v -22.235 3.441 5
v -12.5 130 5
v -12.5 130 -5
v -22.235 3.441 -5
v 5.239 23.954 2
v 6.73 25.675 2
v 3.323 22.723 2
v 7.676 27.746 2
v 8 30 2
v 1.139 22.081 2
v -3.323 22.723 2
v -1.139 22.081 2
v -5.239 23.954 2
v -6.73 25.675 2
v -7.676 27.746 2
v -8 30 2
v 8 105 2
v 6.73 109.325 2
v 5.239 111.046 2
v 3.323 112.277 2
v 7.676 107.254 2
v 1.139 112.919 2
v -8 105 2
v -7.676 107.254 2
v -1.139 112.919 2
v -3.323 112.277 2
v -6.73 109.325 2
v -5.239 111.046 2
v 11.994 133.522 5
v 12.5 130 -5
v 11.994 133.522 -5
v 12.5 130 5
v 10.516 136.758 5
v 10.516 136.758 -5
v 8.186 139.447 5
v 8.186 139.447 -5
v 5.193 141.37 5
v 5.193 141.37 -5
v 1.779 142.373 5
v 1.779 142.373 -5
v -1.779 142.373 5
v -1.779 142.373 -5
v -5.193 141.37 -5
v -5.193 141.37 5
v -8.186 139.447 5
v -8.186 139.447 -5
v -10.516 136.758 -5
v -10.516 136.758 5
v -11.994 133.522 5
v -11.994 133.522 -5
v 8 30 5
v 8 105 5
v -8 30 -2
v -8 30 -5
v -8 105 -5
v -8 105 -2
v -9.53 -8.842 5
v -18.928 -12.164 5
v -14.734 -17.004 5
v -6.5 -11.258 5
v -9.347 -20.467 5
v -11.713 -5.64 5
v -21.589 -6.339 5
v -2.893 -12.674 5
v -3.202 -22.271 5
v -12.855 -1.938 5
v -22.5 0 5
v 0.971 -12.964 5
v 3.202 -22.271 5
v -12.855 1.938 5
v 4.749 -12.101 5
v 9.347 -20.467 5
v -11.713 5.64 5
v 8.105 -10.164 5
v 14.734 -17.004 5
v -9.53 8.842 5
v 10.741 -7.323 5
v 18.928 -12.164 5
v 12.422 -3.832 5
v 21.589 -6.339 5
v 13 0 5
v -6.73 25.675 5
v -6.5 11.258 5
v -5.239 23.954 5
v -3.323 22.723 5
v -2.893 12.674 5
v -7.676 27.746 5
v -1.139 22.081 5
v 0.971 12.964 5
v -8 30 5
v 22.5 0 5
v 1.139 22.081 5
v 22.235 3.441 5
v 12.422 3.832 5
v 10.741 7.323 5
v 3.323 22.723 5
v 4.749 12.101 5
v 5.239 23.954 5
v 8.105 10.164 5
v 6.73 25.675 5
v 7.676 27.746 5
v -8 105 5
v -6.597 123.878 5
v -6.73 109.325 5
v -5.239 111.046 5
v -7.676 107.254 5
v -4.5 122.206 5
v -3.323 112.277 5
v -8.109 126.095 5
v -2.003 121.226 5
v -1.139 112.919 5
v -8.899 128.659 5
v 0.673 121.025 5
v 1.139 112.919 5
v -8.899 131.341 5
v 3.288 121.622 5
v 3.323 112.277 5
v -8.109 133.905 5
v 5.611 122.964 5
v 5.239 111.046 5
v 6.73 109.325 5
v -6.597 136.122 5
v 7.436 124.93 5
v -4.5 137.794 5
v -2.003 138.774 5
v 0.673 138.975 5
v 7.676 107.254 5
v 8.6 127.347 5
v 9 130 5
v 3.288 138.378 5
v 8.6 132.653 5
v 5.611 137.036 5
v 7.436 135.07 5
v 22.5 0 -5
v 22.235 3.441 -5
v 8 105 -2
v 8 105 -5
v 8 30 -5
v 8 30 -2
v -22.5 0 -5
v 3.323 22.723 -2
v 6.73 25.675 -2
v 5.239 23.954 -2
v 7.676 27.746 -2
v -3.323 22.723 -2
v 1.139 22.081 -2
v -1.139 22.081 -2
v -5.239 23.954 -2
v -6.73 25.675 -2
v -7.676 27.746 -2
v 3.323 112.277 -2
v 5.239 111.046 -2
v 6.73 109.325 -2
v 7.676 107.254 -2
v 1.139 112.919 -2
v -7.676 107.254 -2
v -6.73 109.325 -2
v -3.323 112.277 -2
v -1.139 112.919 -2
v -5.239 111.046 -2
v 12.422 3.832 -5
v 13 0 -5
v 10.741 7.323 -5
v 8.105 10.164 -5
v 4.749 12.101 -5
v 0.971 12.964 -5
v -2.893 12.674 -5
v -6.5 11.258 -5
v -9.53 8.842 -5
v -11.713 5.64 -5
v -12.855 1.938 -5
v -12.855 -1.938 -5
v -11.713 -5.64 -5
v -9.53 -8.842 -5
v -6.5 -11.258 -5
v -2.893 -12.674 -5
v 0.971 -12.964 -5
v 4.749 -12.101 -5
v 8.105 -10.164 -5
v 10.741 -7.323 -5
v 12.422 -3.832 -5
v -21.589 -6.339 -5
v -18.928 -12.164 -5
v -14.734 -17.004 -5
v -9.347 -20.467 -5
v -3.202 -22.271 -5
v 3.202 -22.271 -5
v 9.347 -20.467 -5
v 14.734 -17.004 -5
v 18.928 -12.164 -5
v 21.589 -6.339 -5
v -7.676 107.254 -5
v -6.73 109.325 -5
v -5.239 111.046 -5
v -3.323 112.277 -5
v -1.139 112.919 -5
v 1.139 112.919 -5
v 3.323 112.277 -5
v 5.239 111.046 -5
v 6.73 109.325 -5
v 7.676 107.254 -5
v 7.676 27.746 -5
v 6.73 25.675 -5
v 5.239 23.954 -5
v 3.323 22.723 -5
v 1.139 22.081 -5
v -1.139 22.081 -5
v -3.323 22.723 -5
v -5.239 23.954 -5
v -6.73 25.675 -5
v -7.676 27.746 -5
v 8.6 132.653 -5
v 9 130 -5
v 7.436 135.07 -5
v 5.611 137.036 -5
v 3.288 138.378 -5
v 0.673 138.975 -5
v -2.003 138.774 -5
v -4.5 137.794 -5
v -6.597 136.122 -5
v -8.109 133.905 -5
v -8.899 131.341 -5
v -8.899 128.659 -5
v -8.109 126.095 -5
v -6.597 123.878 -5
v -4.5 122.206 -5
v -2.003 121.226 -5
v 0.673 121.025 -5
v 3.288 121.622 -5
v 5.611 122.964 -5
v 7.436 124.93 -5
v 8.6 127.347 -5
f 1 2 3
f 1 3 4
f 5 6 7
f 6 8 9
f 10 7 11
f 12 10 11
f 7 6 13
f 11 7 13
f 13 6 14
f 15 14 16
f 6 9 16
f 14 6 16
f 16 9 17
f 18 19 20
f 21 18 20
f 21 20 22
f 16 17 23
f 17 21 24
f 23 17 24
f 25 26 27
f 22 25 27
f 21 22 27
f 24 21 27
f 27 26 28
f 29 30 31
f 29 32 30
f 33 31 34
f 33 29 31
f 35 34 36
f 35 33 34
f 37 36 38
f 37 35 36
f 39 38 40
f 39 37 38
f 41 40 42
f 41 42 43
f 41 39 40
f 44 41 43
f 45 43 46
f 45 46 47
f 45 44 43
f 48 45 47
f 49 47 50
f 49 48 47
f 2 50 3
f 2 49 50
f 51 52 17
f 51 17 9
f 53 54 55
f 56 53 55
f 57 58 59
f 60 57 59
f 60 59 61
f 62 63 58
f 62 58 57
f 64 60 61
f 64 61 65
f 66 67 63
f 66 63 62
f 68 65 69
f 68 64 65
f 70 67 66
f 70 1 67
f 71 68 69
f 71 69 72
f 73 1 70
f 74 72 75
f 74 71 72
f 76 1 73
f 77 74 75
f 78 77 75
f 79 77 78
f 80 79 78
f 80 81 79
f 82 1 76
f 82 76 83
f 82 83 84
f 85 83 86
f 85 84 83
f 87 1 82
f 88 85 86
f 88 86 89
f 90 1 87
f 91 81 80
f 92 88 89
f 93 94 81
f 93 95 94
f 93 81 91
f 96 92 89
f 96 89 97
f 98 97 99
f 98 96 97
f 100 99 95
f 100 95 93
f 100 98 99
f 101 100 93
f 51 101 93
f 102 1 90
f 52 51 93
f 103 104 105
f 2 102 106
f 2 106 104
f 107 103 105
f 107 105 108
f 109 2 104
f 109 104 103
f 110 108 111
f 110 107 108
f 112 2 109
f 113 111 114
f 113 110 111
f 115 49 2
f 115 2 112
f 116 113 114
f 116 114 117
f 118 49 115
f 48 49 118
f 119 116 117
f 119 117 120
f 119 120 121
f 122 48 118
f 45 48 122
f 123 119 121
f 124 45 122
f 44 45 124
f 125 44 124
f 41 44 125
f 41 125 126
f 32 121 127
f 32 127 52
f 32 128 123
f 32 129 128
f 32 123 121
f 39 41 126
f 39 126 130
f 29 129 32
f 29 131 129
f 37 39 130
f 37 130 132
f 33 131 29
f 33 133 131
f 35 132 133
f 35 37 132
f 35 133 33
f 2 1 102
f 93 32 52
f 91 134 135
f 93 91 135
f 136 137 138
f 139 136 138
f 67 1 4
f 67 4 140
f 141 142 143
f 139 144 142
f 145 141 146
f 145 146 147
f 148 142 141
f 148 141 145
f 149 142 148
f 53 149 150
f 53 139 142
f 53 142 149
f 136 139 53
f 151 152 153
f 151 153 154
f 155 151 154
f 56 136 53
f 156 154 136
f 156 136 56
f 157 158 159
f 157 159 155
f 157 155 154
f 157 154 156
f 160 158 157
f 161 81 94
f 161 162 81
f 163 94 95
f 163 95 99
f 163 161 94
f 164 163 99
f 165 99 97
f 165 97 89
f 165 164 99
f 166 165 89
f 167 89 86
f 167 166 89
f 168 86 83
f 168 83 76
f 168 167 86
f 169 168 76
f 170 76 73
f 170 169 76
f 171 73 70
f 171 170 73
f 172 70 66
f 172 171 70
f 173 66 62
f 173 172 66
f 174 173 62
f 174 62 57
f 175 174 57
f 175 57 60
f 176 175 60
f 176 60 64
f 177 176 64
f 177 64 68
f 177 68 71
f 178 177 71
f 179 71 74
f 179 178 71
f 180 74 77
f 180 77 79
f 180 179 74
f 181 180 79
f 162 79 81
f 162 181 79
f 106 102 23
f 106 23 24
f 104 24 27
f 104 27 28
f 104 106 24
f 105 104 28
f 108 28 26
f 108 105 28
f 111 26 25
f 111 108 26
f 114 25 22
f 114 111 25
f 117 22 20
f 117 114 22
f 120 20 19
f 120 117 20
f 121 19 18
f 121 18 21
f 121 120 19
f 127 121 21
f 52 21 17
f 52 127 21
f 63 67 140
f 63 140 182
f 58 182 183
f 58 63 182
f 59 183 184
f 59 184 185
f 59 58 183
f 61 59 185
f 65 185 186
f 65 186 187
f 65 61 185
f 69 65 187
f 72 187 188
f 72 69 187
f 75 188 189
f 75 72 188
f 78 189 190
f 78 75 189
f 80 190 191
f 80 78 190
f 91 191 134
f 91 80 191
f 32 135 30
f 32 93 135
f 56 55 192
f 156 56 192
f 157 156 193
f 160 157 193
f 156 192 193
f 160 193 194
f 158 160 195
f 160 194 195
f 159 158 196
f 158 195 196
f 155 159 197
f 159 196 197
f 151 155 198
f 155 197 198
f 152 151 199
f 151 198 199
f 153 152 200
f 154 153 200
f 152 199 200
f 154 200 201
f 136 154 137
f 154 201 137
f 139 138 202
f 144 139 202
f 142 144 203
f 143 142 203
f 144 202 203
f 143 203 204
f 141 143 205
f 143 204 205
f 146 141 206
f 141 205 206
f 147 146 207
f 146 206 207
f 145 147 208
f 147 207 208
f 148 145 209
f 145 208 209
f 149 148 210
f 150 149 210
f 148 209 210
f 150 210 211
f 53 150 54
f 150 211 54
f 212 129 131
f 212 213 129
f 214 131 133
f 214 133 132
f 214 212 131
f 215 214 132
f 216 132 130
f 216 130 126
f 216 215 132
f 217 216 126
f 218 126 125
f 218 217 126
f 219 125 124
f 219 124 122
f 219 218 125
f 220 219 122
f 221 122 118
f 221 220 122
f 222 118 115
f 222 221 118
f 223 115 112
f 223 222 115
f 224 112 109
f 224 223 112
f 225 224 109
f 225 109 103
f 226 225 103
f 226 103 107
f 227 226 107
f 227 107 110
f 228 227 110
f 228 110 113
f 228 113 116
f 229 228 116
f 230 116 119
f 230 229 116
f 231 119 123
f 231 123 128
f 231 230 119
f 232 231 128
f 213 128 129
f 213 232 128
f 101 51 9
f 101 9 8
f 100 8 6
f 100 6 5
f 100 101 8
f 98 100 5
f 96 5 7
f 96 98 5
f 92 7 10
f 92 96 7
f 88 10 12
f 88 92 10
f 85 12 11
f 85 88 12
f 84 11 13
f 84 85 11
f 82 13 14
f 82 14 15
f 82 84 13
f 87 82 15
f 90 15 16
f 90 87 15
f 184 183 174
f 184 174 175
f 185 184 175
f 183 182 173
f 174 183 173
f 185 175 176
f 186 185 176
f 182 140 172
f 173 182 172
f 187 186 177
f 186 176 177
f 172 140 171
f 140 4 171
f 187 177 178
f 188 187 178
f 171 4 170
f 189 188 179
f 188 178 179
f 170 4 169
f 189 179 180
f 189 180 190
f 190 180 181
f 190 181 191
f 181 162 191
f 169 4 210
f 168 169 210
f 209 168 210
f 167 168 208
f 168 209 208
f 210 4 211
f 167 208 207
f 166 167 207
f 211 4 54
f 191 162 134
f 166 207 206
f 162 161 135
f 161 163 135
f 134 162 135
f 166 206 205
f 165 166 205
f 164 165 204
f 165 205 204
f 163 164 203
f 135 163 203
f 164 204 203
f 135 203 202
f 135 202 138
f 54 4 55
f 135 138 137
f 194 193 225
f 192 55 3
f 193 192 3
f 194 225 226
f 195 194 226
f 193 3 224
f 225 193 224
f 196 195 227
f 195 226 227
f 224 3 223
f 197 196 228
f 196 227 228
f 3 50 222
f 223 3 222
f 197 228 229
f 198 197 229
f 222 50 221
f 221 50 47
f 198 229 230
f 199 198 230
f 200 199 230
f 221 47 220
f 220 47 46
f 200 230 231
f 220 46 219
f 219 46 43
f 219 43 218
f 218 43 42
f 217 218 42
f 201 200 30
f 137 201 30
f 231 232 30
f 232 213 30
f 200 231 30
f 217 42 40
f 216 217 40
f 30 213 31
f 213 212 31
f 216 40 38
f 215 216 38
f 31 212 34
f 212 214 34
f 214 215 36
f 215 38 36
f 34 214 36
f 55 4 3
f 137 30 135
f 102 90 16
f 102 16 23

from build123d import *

# Parameters (mm, degrees)
SKETCH1_R           = 13
SKETCH1_R_2         = 9
BOSS_EXTRUDE1_DEPTH = 5
CUT_EXTRUDE1_DEPTH  = 3


with BuildPart() as part:
    # Sketch1 → Boss-Extrude1 (new, symmetric)
    with BuildSketch(Plane.XY):
        with BuildLine():
            ThreePointArc((12.5, 130), (0, 142.5), (-12.5, 130))
            Line((-12.5, 130), (-22.235294118, 3.441176471))
            Line((-22.235294118, 3.441176471), (-22.5, 0))
            ThreePointArc((-22.5, 0), (0, -22.5), (22.5, 0))
            Line((22.5, 0), (22.235294118, 3.441176471))
            Line((22.235294118, 3.441176471), (12.5, 130))
        make_face()
        Circle(SKETCH1_R, mode=Mode.SUBTRACT)
        with Locations((0, 130)):
            Circle(SKETCH1_R_2, mode=Mode.SUBTRACT)
    extrude(amount=BOSS_EXTRUDE1_DEPTH, both=True)

    # Sketch2 → Cut-Extrude1 (cut)
    with BuildSketch(Plane.XY.offset(5)):
        with BuildLine():
            Line((8, 105), (8, 30))
            ThreePointArc((8, 30), (0, 22), (-8, 30))
            Line((-8, 30), (-8, 105))
            ThreePointArc((-8, 105), (0, 113), (8, 105))
        make_face()
    cut_extrude1 = extrude(amount=-CUT_EXTRUDE1_DEPTH, mode=Mode.SUBTRACT)

    # Mirror1: Cut-Extrude1 across plane
    add(cut_extrude1.mirror(Plane.XY), mode=Mode.SUBTRACT)


solid = part.part
